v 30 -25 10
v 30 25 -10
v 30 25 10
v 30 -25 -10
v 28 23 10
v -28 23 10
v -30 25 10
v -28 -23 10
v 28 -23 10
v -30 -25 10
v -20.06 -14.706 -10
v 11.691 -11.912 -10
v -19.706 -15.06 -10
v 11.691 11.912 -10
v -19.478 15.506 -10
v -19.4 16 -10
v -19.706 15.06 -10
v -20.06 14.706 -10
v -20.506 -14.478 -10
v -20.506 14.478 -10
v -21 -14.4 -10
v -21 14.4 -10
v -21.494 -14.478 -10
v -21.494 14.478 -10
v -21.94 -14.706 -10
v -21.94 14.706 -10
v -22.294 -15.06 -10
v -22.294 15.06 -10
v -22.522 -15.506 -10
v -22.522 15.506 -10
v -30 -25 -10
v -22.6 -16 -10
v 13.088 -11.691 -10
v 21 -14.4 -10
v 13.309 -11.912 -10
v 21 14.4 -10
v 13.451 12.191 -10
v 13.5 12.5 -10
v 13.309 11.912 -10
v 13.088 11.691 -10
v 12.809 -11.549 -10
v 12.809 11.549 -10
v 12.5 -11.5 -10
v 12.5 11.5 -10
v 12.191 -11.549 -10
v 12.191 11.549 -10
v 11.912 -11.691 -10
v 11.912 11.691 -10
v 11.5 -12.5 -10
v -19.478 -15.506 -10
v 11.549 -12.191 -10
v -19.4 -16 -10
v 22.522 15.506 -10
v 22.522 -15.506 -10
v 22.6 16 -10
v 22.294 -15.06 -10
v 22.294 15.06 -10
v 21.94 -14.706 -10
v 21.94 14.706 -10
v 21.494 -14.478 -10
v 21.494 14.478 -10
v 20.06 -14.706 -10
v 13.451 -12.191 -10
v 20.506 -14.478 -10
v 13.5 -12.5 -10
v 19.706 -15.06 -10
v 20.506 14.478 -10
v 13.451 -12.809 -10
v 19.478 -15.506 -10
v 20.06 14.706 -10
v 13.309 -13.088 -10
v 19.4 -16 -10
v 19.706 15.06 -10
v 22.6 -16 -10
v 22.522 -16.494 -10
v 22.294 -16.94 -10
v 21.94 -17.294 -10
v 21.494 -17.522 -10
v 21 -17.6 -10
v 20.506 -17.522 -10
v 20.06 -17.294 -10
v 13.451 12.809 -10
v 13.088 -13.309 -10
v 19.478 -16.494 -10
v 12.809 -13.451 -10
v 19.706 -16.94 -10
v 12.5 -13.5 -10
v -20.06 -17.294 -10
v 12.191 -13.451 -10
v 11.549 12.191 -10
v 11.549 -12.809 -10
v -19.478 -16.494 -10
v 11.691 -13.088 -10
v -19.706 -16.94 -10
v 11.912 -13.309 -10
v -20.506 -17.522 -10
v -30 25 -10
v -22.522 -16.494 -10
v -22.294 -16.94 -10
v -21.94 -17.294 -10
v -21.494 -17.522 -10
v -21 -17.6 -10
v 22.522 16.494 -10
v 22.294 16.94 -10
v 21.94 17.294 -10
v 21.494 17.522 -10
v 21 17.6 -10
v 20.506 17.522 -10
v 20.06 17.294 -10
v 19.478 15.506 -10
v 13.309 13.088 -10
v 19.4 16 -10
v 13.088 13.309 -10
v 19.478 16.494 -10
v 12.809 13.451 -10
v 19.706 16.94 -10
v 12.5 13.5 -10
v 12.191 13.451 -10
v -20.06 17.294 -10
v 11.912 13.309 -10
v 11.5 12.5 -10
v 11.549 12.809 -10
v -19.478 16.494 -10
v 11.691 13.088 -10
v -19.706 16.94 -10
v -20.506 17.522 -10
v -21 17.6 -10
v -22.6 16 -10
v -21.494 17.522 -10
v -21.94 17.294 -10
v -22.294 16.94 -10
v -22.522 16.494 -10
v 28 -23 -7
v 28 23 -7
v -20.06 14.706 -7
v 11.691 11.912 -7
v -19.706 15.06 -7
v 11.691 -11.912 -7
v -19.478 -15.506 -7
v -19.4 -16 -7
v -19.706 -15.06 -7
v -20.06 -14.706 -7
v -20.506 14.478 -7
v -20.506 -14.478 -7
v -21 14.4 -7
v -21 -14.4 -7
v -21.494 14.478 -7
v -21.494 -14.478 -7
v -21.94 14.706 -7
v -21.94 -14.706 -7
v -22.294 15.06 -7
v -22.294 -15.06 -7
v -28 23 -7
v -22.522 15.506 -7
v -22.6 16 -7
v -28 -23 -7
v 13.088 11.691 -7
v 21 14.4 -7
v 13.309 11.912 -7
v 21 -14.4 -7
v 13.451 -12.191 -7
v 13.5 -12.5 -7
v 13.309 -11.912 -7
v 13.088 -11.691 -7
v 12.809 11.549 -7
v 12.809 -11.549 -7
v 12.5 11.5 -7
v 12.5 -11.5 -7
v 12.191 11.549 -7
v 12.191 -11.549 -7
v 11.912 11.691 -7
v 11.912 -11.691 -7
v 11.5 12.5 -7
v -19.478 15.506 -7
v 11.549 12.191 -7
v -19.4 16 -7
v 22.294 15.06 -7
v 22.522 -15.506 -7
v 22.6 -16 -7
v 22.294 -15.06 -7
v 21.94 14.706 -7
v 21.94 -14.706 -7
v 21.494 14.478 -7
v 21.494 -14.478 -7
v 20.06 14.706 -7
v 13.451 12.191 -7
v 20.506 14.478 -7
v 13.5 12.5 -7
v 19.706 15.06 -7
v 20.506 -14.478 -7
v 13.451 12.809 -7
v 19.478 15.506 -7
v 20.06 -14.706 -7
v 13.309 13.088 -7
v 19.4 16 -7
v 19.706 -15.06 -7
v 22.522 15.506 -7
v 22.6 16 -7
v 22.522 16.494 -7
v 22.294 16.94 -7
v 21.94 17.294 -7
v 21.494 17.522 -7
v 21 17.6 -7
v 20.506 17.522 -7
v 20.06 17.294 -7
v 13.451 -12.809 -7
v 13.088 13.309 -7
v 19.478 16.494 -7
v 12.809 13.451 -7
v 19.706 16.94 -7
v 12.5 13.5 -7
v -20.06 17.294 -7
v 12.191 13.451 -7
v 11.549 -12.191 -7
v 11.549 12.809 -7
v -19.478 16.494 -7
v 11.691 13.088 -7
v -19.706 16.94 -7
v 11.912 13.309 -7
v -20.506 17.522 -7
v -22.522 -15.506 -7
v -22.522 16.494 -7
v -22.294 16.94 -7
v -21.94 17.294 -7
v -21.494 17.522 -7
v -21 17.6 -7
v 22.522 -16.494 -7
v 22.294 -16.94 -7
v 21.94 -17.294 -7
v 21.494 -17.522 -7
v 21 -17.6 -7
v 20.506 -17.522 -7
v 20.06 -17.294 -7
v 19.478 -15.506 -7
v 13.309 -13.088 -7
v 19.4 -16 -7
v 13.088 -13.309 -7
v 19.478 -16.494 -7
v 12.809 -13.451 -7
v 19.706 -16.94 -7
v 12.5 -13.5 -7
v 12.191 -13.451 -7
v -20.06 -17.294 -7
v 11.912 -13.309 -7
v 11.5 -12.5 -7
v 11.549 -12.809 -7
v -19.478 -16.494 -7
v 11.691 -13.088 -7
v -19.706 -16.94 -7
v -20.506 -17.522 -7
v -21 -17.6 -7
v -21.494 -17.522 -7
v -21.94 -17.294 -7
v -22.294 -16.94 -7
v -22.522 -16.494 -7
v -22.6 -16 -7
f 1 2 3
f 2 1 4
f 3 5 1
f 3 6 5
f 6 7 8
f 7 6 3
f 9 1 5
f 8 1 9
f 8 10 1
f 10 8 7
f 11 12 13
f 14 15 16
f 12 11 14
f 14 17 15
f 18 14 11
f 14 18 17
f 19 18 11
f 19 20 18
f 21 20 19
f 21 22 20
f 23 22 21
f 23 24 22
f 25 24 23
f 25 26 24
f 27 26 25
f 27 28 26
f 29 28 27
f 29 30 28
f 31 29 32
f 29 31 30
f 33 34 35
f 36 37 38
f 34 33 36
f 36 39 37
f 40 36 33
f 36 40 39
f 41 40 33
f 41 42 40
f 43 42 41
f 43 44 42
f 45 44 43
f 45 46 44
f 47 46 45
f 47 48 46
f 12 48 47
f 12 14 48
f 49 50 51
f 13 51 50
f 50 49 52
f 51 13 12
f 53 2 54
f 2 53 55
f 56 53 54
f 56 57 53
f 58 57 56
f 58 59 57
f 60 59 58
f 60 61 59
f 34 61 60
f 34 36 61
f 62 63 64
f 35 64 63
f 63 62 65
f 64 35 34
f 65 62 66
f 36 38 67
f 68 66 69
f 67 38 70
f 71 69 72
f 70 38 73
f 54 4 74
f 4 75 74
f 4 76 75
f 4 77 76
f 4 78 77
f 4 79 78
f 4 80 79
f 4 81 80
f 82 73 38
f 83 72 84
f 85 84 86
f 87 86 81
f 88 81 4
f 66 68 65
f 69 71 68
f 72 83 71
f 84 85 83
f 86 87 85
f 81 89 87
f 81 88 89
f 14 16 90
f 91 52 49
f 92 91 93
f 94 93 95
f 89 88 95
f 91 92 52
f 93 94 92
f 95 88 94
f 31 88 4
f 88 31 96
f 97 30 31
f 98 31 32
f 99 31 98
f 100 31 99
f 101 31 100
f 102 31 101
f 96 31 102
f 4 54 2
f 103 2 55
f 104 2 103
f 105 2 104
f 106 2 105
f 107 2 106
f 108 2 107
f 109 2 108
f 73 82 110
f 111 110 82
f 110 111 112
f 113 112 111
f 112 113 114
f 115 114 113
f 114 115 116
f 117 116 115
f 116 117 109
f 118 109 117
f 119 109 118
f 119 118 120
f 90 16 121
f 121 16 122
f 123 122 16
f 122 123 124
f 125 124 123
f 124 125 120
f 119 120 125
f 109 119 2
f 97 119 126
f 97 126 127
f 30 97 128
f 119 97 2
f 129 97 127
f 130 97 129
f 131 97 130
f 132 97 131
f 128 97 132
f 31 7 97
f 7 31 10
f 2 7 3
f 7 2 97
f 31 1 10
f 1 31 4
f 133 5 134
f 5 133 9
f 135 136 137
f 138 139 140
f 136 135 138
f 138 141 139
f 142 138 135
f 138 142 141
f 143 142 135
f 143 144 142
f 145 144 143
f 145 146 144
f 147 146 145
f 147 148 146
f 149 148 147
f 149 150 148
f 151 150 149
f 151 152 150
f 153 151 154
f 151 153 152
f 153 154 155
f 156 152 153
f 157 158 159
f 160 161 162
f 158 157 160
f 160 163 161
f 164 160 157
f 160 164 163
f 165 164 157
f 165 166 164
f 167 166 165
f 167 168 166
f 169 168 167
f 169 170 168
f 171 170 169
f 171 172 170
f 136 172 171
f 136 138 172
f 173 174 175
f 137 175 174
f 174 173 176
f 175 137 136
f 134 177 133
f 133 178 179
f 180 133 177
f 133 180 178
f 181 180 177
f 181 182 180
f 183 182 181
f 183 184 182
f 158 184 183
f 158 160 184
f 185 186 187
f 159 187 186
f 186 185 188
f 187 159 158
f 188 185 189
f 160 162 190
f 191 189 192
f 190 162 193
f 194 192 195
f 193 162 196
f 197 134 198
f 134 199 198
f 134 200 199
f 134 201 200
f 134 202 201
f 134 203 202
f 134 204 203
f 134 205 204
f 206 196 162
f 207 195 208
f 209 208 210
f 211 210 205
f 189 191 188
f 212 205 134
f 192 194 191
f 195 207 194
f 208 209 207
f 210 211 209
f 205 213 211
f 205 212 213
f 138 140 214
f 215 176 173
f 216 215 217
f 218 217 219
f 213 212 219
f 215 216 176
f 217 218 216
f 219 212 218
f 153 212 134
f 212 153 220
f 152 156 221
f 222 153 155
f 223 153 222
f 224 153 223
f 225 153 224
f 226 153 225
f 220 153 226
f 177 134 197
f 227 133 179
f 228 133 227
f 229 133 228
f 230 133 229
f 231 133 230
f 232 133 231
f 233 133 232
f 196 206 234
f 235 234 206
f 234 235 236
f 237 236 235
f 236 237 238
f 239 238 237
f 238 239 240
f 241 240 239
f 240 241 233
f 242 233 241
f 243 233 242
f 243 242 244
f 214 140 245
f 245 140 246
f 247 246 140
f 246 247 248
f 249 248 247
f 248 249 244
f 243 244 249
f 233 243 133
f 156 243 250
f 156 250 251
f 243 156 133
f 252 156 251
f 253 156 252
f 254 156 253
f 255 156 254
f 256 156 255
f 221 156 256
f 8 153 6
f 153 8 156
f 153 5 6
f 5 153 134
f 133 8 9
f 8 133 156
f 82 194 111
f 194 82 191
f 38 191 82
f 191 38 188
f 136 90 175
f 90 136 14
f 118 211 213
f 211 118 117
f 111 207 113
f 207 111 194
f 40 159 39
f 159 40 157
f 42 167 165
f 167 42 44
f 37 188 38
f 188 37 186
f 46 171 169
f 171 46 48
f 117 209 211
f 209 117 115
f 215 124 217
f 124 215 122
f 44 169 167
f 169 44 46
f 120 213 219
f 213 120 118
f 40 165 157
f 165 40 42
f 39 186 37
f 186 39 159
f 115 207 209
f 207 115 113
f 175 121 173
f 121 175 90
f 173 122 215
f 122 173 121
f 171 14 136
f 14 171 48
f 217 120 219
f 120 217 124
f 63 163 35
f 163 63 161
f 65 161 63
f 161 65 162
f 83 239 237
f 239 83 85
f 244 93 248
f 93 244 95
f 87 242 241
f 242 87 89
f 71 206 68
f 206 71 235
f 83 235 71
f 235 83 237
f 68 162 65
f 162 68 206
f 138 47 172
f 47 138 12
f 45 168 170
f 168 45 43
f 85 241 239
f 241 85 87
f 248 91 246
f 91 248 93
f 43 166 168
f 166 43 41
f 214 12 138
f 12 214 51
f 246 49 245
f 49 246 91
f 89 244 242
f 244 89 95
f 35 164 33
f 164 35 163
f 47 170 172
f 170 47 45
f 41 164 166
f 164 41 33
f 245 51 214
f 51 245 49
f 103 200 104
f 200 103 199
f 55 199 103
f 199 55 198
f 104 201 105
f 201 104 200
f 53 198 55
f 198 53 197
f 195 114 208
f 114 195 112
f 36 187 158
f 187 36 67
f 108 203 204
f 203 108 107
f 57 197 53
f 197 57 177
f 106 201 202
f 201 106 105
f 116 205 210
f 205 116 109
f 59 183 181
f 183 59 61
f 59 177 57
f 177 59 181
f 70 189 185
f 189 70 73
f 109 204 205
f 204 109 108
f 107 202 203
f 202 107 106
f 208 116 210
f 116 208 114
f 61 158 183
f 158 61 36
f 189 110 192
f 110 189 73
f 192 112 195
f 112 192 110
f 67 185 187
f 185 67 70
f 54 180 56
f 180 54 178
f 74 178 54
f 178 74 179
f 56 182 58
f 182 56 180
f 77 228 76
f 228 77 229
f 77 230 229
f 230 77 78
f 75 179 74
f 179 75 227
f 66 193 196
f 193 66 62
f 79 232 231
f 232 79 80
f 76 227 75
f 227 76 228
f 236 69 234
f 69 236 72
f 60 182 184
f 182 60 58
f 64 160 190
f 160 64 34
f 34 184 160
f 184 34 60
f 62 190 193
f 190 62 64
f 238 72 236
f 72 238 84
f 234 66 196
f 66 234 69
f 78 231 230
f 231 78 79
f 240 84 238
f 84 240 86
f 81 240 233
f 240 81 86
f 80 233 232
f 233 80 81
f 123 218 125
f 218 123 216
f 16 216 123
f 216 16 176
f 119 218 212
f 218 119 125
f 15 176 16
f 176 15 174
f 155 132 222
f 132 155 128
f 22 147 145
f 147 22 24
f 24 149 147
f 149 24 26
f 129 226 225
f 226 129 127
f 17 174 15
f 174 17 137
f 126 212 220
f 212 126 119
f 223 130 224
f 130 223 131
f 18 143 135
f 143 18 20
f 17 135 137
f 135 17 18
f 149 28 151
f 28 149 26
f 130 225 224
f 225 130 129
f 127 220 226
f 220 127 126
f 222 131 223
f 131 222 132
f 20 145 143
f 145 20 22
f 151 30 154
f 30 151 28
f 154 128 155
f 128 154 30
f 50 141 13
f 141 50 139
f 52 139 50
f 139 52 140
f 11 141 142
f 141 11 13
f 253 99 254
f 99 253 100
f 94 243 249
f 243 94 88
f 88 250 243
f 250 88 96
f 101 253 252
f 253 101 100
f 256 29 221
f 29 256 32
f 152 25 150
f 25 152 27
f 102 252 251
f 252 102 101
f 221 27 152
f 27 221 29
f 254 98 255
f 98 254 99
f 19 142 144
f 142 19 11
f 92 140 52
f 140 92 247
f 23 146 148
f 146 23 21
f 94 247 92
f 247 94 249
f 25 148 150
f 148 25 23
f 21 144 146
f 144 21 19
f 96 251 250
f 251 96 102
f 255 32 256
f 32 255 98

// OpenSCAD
// Case enclosure for:
//   Adafruit TCA9548a I2C multiplexer board
//

// Number of facets for cylinders
$fn = 20;

enclosure_x_dim = 60;
enclosure_y_dim = 50;
enclosure_height = 20;

base_thickness = 3;
wall_width = 2;
wall_height = enclosure_height;

tca9548_standoff_xoffset = 12.5;
tca9548_standoff_yoffset = 12.5;
standoff_hole_radius = 1;

mount_x_offset = 21;
mount_y_offset = 16;
mount_hole_radius = 1.6;

BELOW_PLANE = -1;
INF = 100000;

difference() {
     // outer extents
    cube([enclosure_x_dim ,enclosure_y_dim ,enclosure_height], center = true);
    translate([0,   0, base_thickness])cube([56,46,20], center = true);
 
    // cutout inside to form walls
    translate([0,   0, base_thickness])cube([enclosure_x_dim -(2*wall_width),enclosure_y_dim -(2*wall_width), wall_height], center = true);
 
    // TCA9548 mounting hols
    translate([tca9548_standoff_xoffset,tca9548_standoff_yoffset,-1])   cylinder(r=standoff_hole_radius, h=20, center=true, $fn=20);
    translate([tca9548_standoff_xoffset,-tca9548_standoff_yoffset,-1])  cylinder(r=  standoff_hole_radius, h=20, center=true, $fn=20);

    // Enclosure mounting holes
    translate([mount_x_offset,mount_y_offset, BELOW_PLANE])   cylinder(r=mount_hole_radius, h=INF, center=true);
    translate([mount_x_offset,-mount_y_offset, BELOW_PLANE])  cylinder(r=mount_hole_radius, h=INF, center=true);
    translate([-mount_x_offset,mount_y_offset, BELOW_PLANE])  cylinder(r=mount_hole_radius, h=INF, center=true);
    translate([-mount_x_offset,-mount_y_offset, BELOW_PLANE]) cylinder(r=mount_hole_radius, h=INF, center=true);
}
